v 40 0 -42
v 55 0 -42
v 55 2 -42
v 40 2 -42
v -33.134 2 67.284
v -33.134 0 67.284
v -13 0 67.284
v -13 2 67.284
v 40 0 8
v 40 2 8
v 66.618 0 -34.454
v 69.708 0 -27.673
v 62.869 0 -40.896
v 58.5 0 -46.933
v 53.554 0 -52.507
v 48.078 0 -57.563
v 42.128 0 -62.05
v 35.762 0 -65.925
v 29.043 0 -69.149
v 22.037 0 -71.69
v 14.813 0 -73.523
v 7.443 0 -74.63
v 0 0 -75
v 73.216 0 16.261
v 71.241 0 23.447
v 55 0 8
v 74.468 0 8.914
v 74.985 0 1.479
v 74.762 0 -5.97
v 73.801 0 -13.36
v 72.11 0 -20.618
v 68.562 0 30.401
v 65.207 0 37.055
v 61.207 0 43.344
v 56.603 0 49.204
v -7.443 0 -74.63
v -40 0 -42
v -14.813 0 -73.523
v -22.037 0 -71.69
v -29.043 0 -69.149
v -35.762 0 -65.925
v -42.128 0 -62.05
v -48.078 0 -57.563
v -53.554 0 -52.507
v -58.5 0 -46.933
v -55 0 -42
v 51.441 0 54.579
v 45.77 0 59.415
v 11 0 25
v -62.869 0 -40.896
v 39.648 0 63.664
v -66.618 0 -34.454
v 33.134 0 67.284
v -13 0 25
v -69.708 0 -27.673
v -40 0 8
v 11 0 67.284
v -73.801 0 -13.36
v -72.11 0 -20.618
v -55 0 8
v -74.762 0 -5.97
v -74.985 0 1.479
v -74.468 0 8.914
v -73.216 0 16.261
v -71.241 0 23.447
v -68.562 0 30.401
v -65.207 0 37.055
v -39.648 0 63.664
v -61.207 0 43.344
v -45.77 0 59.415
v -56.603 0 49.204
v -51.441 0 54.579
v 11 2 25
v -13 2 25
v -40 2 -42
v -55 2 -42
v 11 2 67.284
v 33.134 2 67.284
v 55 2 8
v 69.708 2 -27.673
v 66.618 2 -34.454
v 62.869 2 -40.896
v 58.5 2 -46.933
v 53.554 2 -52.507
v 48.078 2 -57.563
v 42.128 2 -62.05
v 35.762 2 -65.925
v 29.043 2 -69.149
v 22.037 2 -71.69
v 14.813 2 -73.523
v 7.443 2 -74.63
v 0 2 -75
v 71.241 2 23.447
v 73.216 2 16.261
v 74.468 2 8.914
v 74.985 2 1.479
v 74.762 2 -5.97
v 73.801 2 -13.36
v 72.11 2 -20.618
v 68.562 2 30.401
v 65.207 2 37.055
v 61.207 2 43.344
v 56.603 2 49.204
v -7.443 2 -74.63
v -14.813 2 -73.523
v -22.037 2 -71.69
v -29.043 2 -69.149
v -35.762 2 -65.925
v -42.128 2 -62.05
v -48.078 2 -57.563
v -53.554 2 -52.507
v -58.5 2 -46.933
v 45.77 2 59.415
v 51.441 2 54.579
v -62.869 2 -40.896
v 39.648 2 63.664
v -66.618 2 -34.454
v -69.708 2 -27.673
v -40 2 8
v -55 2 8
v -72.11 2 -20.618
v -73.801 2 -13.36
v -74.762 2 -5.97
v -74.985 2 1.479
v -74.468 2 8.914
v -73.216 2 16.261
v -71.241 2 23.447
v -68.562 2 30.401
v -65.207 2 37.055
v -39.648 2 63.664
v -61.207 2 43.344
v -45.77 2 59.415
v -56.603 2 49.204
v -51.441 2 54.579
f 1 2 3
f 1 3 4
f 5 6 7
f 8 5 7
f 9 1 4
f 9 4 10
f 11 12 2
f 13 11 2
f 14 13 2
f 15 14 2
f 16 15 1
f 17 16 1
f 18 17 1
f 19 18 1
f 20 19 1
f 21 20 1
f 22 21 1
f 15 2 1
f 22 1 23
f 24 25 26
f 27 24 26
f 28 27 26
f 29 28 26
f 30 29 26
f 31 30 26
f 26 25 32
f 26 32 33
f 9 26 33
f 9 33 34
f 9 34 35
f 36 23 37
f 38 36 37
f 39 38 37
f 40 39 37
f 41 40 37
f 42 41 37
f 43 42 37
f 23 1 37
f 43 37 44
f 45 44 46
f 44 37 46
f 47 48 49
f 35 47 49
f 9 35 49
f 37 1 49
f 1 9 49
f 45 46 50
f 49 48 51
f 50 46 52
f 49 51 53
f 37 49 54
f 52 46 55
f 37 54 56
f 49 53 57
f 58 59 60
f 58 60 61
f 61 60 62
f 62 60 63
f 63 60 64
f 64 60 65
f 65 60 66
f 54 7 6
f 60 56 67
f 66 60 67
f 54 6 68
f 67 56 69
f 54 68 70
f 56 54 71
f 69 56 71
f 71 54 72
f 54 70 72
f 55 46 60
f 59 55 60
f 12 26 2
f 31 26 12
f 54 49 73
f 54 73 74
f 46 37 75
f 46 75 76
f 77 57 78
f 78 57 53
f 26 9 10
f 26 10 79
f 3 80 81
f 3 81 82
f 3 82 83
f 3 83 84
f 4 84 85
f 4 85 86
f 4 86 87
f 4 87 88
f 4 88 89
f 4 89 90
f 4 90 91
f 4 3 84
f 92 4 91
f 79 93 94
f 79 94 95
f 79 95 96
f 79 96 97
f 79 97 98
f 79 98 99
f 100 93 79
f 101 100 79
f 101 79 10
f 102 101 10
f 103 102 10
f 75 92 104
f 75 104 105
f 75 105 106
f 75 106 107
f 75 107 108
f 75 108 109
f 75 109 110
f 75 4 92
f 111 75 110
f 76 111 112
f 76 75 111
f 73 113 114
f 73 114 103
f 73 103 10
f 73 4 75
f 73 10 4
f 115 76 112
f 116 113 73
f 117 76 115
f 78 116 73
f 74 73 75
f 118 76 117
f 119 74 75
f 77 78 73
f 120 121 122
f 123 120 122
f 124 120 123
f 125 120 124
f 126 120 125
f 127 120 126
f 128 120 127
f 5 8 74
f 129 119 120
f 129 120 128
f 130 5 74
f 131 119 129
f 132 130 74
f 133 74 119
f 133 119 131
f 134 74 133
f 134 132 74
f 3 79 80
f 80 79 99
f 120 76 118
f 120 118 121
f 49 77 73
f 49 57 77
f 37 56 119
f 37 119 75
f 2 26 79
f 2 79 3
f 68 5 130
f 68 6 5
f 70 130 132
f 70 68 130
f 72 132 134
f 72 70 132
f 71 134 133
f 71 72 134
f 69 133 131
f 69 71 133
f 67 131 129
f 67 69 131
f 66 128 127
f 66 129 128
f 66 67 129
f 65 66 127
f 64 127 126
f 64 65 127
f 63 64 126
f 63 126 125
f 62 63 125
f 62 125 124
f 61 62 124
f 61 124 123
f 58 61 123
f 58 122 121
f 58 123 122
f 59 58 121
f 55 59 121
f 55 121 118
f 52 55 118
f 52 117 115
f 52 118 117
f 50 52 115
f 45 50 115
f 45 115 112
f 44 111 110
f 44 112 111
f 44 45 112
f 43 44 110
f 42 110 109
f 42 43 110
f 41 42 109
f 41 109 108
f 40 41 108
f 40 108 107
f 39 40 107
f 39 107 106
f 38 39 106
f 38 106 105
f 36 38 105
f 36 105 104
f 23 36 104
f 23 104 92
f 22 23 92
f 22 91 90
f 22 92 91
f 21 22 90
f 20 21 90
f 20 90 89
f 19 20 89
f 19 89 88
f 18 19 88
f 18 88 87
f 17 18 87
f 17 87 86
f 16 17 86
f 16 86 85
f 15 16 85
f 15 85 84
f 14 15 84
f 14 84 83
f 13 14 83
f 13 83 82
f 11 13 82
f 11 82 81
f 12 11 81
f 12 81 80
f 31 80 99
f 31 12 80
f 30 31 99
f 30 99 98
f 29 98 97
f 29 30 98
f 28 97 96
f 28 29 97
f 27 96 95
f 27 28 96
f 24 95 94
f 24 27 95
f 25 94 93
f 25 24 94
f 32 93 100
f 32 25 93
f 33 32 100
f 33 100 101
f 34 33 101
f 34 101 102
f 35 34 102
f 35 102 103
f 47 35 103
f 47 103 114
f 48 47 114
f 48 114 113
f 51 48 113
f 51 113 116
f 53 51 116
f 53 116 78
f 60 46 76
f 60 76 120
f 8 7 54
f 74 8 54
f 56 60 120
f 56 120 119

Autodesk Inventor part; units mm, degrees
ref_plane "YZ Plane" through (0, 0, 0) normal (1, 0, 0) x (0, 1, 0)
ref_plane "XZ Plane" through (0, 0, 0) normal (0, 1, 0) x (-1, 0, 0)
ref_plane "XY Plane" through (0, 0, 0) normal (0, 0, 1) x (1, 0, 0)
sketch "Boceto1" plane through (0, 0, 0) normal (0, 1, 0) x (-1, 0, 0)
  arc A0 (-18, 72.808) -> (20, 72.2842) centre (0, 0) ccw
  line L0 (-18, 72.808) -> (-18, 72.2842)
  line L1 (-11, 25) -> (13, 25)
  line L2 (55, 8) -> (40, 8)
  line L3 (40, 8) -> (40, -42)
  line L4 (40, -42) -> (55, -42)
  line L5 (55, -42) -> (55, 8)
  line L6 (-40, 8) -> (-55, 8)
  line L7 (-55, 8) -> (-55, -42)
  line L8 (-55, -42) -> (-40, -42)
  line L9 (-40, -42) -> (-40, 8)
  line L10 (20, 72.2842) -> (13, 72.2842)
  line L11 (13, 72.2842) -> (13, 25)
  line L12 (-18, 72.808) -> (-11, 72.808)
  line L13 (-11, 72.808) -> (-11, 25)
  line L14 (-18, 72.2842) -> (-18, 72.808)
  dimension "d0" = 150
  dimension "d2" = 18
  dimension "d3" = 25
  dimension "d4" = 15
  dimension "d5" = 50
  dimension "d6" = 15
  dimension "d7" = 50
  dimension "d8" = 40
  dimension "d9" = 40
  dimension "d63" = 8
  dimension "d64" = 8
extrude "Extrusión1" add sketch "Boceto1" along normal blind 2
sketch "Boceto8" plane through (0, 0, 0) normal (0, 1, 0) x (-1, 0, 0)
  line L0 (59.5508, 67.2842) -> (-59.748, 67.2842)
  line L1 (-59.748, 67.2842) -> (-59.748, 82.2842)
  line L2 (-59.748, 82.2842) -> (59.5508, 82.2842)
  line L3 (59.5508, 82.2842) -> (59.5508, 67.2842)
  line L4 (13, 72.2842) -> (20, 72.2842) projected
  point P0 (0, 0)
  dimension "d67" = 15
  dimension "d71" = 5
extrude "Extrusión8" cut sketch "Boceto8" along normal mid plane 70
properties part number "Cuerpo" material "Polímero reforzado con fibra de carbono"
